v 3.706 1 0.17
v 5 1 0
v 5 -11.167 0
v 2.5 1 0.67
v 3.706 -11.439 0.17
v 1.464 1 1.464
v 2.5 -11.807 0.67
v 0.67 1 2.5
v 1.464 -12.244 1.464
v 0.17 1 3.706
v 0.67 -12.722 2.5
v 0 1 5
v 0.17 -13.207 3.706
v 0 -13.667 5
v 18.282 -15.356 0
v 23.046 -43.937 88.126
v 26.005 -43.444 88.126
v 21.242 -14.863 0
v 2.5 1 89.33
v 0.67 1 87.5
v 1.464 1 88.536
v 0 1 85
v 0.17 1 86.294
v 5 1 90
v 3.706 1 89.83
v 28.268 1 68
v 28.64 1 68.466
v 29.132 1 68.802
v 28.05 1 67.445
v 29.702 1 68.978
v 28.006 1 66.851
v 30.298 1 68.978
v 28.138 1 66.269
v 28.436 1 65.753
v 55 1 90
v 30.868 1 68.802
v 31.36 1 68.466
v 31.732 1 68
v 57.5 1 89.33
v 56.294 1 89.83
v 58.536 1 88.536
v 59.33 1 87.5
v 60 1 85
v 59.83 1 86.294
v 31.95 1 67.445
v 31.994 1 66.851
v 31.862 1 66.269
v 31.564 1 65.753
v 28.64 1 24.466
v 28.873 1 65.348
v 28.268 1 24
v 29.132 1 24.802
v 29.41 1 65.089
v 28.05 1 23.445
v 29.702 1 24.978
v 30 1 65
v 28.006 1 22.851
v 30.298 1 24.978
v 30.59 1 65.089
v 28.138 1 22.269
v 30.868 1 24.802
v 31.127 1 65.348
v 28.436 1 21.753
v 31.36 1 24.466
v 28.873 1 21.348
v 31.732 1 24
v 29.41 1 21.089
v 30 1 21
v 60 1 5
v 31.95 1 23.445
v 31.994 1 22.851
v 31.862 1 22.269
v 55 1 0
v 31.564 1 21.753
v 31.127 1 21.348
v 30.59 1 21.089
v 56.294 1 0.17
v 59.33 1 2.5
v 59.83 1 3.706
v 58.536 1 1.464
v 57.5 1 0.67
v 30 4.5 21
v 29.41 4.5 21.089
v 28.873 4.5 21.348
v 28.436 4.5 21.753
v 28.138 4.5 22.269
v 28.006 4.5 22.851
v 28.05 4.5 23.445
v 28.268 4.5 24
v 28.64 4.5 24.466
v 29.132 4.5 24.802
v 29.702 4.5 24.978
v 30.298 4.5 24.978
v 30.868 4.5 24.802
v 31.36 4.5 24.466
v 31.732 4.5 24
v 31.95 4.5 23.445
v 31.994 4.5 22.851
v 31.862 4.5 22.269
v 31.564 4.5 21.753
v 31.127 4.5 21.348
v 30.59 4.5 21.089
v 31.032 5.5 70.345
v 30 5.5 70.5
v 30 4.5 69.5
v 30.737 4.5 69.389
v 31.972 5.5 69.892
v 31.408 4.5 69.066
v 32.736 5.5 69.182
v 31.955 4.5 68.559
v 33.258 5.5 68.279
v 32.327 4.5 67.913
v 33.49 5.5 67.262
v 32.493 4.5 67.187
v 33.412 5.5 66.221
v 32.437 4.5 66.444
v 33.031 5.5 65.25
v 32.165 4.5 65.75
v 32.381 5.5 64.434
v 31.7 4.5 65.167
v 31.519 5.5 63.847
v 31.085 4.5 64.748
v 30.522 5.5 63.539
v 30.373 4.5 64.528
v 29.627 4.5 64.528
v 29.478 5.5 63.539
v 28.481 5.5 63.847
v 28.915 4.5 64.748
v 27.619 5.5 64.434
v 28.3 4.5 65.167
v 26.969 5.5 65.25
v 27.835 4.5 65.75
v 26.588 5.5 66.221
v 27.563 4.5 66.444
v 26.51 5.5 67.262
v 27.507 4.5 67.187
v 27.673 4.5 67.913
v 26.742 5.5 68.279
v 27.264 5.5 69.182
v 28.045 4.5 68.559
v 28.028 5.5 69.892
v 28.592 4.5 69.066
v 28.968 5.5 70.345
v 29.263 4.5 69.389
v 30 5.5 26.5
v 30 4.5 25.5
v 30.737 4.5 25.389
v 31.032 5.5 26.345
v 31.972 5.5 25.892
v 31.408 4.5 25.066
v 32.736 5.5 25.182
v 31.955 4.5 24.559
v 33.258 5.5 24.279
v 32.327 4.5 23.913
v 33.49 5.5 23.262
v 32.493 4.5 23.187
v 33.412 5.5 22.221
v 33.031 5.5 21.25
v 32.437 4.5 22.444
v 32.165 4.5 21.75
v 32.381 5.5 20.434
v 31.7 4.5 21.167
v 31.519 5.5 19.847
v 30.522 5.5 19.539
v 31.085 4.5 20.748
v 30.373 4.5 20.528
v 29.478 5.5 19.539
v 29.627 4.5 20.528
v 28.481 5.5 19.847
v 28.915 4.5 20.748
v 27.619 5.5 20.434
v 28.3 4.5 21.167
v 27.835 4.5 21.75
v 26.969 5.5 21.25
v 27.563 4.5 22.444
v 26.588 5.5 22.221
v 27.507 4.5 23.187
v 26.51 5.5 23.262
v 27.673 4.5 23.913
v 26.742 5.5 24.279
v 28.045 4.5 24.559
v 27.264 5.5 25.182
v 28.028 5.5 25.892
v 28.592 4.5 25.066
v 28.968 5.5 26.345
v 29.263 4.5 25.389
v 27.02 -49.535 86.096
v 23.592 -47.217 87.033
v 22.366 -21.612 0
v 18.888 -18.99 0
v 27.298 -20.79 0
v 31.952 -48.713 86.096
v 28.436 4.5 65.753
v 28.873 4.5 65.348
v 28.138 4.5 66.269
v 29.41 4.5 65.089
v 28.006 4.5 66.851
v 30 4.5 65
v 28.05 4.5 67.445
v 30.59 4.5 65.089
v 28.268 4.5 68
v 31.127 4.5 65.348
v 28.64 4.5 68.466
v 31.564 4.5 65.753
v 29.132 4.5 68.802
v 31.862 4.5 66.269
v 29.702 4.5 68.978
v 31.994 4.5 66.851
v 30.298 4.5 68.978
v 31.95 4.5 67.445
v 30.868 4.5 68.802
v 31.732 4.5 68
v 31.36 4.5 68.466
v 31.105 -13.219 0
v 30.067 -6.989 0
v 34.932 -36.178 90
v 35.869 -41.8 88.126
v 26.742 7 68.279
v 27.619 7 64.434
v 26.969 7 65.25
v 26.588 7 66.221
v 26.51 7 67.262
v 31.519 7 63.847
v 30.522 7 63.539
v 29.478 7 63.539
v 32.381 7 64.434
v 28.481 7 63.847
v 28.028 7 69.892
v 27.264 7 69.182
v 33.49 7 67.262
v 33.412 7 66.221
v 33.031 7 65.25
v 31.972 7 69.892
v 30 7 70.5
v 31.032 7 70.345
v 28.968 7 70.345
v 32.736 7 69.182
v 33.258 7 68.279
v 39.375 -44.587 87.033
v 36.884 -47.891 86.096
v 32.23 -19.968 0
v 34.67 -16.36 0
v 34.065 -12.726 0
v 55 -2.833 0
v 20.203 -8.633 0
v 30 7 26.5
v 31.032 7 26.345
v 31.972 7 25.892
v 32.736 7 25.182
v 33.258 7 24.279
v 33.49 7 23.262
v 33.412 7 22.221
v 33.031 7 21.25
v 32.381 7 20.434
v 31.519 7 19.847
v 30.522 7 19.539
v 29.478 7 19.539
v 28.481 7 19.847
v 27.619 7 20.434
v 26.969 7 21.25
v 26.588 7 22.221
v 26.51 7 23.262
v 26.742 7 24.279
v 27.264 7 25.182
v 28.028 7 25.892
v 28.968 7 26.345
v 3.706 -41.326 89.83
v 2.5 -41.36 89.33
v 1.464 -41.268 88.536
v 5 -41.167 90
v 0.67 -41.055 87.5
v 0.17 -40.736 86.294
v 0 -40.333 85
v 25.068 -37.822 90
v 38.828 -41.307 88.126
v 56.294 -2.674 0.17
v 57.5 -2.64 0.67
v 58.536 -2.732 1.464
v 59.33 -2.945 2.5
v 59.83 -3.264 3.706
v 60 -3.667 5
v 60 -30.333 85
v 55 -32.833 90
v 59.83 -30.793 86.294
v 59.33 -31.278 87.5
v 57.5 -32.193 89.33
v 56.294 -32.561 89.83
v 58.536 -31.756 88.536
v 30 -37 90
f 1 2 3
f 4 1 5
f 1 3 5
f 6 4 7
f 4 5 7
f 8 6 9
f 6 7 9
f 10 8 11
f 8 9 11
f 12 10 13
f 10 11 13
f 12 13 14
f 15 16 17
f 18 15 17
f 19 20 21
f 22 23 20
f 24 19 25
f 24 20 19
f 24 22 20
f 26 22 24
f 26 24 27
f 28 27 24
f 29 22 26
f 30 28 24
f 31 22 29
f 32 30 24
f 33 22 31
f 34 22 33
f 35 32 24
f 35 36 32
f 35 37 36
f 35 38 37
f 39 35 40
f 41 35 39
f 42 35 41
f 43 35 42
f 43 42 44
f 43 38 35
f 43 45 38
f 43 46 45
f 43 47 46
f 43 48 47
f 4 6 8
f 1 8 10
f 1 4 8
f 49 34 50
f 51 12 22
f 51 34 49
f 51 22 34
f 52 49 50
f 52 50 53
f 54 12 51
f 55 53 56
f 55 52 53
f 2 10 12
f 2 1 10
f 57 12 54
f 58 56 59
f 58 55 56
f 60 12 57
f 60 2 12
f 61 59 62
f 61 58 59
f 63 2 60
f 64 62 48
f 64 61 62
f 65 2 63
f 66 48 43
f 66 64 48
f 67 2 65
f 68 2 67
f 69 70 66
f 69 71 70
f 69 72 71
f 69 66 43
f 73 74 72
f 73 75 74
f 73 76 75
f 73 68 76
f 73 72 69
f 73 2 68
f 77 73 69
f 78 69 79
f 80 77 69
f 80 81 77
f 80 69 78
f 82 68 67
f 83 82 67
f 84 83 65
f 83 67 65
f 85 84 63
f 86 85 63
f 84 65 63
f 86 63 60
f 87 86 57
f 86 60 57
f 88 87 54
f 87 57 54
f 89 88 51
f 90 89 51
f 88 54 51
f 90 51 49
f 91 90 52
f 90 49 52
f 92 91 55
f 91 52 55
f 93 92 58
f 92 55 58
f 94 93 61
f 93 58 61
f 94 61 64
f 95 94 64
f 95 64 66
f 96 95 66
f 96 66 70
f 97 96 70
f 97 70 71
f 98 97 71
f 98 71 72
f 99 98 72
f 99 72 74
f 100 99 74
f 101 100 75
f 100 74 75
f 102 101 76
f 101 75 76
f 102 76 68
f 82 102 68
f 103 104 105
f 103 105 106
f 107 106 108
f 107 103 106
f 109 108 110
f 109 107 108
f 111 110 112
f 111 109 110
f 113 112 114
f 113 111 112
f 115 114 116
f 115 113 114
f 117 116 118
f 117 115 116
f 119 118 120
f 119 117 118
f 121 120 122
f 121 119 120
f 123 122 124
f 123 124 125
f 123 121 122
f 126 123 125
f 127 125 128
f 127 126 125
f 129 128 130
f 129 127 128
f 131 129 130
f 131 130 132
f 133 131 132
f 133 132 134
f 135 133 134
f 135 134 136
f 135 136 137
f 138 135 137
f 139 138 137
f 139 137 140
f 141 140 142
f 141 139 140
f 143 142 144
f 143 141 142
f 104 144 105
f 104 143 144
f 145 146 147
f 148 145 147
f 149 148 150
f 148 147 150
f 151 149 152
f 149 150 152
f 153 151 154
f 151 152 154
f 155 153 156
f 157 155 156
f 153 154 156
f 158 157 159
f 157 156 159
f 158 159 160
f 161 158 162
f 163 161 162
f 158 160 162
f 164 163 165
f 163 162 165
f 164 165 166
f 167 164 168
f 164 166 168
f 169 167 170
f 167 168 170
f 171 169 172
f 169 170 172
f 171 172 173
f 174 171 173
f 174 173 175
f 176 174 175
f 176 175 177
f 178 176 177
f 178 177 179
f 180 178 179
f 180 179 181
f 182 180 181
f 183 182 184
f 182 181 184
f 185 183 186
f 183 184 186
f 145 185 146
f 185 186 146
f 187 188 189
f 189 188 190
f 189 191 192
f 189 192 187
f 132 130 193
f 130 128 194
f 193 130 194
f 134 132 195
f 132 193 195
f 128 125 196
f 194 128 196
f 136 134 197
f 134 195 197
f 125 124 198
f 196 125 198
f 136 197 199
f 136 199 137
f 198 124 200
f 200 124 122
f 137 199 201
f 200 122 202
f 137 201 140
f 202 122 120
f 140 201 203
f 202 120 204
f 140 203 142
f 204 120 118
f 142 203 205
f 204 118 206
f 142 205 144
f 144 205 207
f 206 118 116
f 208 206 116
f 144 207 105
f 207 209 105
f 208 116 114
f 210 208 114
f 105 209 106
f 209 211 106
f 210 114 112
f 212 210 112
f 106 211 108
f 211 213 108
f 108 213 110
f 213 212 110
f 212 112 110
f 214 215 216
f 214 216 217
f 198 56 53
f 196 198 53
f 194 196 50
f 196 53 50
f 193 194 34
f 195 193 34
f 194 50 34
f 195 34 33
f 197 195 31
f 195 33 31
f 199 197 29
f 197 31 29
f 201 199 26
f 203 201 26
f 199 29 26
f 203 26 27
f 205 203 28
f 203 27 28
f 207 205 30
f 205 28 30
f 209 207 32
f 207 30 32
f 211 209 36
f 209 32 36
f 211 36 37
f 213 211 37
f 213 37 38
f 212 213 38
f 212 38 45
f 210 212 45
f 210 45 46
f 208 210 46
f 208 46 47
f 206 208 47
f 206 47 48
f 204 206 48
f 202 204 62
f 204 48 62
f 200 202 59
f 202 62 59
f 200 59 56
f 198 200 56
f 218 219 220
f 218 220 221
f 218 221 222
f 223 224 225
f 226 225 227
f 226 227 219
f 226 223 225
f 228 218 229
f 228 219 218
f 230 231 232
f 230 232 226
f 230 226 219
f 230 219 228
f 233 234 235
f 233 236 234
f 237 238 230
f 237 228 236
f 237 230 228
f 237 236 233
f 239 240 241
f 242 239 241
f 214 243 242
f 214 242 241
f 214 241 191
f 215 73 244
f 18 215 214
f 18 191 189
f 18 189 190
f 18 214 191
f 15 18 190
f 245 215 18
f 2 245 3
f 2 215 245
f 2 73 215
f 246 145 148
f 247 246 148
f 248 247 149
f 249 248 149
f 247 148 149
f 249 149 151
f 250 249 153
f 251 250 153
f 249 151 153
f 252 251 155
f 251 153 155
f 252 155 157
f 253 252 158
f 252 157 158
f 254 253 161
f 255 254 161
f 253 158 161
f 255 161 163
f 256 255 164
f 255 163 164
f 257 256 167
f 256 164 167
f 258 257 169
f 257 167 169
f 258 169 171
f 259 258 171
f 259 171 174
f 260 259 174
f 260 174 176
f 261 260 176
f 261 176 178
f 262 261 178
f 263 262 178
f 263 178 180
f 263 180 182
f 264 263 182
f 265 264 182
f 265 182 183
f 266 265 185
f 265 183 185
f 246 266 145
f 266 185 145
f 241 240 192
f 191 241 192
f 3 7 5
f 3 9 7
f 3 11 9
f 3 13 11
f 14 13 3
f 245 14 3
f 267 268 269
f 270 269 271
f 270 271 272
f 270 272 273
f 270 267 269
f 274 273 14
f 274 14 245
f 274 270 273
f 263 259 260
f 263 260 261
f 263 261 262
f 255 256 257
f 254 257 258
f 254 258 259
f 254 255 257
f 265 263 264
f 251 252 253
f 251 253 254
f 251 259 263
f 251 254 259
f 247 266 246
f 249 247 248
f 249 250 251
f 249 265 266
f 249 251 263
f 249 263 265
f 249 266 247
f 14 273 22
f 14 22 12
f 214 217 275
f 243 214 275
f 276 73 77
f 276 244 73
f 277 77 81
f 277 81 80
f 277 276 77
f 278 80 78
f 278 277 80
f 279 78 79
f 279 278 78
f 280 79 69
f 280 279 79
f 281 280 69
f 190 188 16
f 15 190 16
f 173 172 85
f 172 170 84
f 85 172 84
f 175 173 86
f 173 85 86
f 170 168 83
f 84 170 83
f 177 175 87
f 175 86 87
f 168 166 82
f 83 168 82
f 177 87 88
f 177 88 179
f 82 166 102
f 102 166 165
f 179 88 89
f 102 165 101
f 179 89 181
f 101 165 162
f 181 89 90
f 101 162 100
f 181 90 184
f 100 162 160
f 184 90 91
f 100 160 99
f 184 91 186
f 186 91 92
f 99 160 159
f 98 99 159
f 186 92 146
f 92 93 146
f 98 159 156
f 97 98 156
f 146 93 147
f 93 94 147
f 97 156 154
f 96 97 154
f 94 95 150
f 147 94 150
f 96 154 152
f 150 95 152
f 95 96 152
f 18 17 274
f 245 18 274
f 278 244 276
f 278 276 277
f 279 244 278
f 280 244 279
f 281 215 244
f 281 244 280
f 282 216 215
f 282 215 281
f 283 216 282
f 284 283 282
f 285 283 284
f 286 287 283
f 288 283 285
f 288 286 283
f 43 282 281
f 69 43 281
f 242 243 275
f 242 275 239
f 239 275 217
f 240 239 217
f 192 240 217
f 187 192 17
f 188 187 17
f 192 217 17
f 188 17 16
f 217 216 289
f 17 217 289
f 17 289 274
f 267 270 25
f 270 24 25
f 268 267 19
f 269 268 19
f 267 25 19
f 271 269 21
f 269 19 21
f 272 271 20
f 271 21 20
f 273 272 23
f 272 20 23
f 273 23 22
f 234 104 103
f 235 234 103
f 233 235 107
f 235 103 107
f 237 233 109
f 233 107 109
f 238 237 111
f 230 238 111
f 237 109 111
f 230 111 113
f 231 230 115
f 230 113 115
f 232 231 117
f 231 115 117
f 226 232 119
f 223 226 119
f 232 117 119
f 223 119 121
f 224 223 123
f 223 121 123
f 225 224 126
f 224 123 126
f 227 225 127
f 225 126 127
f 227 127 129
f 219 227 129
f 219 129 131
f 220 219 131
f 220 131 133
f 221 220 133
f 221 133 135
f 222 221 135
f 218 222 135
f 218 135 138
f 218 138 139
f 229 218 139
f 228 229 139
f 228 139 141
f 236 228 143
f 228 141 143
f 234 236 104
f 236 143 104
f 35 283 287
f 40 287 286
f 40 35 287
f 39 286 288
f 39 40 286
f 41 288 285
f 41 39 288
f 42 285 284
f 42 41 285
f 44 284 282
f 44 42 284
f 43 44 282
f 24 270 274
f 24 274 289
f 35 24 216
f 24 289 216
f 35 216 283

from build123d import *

# Parameters (mm, degrees)
BOSS_EXTRUDE1_DEPTH      = 1
BOSS_EXTRUDE1_DEPTH_BACK = 2
SKETCH1_W                = 60
SKETCH1_H                = 90
SKETCH2_R                = 2
BOSS_EXTRUDE2_DEPTH      = 3.5
SKETCH3_R                = 3.5
BOSS_EXTRUDE3_DEPTH      = 2.5
CHAMFER1_SIZE            = 1
BOSS_EXTRUDE5_REACH      = 138.434
SKETCH1_3_W              = 60
SKETCH1_3_H              = 90
BOSS_EXTRUDE6_REACH      = 116.794
CHAMFER2_SIZE            = 3
FILLET1_R                = 5


with BuildPart() as part:
    # Sketch1 → Boss-Extrude1 (new, two sides: drawn at the far end of the back side and taken through both)
    with BuildSketch(Plane(origin=(0, 0, 0), x_dir=(1, 0, 0), z_dir=(0, 1, 0)).offset(-BOSS_EXTRUDE1_DEPTH_BACK)):
        with Locations((30, -45)):
            Rectangle(SKETCH1_W, SKETCH1_H)
    extrude(amount=BOSS_EXTRUDE1_DEPTH + BOSS_EXTRUDE1_DEPTH_BACK)

    # Sketch2 → Boss-Extrude2 (add)
    with BuildSketch(Plane(origin=(0, 1, 0), x_dir=(1, 0, 0), z_dir=(0, 1, 0))):
        with Locations((30, -23)):
            Circle(SKETCH2_R)
        with Locations((30, -67)):
            Circle(SKETCH2_R)
    extrude(amount=BOSS_EXTRUDE2_DEPTH)

    # Sketch3 → Boss-Extrude3 (add)
    with BuildSketch(Plane(origin=(0, 4.5, 0), x_dir=(1, 0, 0), z_dir=(0, 1, 0))):
        with Locations((30, -23)):
            Circle(SKETCH3_R)
        with Locations((30, -67)):
            Circle(SKETCH3_R)
    extrude(amount=BOSS_EXTRUDE3_DEPTH)

    # Chamfer1
    chamfer1_edges = [part.edges().sort_by_distance(p)[0] for p in [
        (26.5, 4.5, 23),
        (26.5, 4.5, 67),
    ]]
    chamfer(chamfer1_edges, length=CHAMFER1_SIZE)

    # Boss-Extrude5: up to this plane
    boss_extrude5_end = Plane(origin=(1.756097561, -10.536585366, -3.512195122), z_dir=(0.1561737618886063, -0.9370425713316366, -0.3123475237772119))
    # Sketch1<3> → Boss-Extrude5 (add, up to the surface)
    with BuildSketch(Plane(origin=(0, 0, 0), x_dir=(1, 0, 0), z_dir=(0, 1, 0)), mode=Mode.PRIVATE) as boss_extrude5_sk1:
        with Locations((30, -45)):
            Rectangle(SKETCH1_3_W, SKETCH1_3_H)
    boss_extrude5_tool1 = split(extrude(boss_extrude5_sk1.sketch, amount=-BOSS_EXTRUDE5_REACH, mode=Mode.PRIVATE), bisect_by=boss_extrude5_end, keep=Keep.BOTH, mode=Mode.PRIVATE)
    add(boss_extrude5_tool1.solids().sort_by_distance((30, 0, 45))[0])

    # Boss-Extrude6: up to this plane
    boss_extrude6_end = Plane(origin=(0, -2, 0), z_dir=(0, 0, -1))
    # Sketch11 → Boss-Extrude6 (add, up to the surface)
    with BuildSketch(Plane(origin=(5.05471325, -30.328279499, 93.512195122), x_dir=(-0.9986694407655652, -0.011316895385518406, 0.05031178748391653), z_dir=(-0.05134961659630974, 0.3080976995778579, -0.9499679070317293)), mode=Mode.PRIVATE) as boss_extrude6_sk1:
        Polygon((-20.078587448, -8.116309156), (-29.948006992, -6.505546026), (-30.91446487, -12.427197753), (-33.875290733, -11.943968814), (-34.922286767, -18.359091518), (-19.131215496, -20.936312525), (-18.084219462, -14.521189821), (-21.045045326, -14.037960882), align=None)
    boss_extrude6_tool1 = split(extrude(boss_extrude6_sk1.sketch, amount=BOSS_EXTRUDE6_REACH, mode=Mode.PRIVATE), bisect_by=boss_extrude6_end, keep=Keep.BOTH, mode=Mode.PRIVATE)
    add(boss_extrude6_tool1.solids().sort_by_distance((31.087503, -43.525016, 87.824995))[0])

    # Chamfer2
    chamfer2_edges = [part.edges().sort_by_distance(p)[0] for p in [
        (37.516413794, -33.436382521, 43.047827976),
        (21.734111013, -36.066766318, 43.047827976),
    ]]
    chamfer(chamfer2_edges, length=CHAMFER2_SIZE)

    # Fillet1
    fillet1_edges = [part.edges().sort_by_distance(p)[0] for p in [
        (60, -0.5, 0),
        (0, -5.5, 0),
        (60, -15.5, 90),
        (0, -20.5, 90),
    ]]
    fillet(fillet1_edges, radius=FILLET1_R)


solid = part.part
